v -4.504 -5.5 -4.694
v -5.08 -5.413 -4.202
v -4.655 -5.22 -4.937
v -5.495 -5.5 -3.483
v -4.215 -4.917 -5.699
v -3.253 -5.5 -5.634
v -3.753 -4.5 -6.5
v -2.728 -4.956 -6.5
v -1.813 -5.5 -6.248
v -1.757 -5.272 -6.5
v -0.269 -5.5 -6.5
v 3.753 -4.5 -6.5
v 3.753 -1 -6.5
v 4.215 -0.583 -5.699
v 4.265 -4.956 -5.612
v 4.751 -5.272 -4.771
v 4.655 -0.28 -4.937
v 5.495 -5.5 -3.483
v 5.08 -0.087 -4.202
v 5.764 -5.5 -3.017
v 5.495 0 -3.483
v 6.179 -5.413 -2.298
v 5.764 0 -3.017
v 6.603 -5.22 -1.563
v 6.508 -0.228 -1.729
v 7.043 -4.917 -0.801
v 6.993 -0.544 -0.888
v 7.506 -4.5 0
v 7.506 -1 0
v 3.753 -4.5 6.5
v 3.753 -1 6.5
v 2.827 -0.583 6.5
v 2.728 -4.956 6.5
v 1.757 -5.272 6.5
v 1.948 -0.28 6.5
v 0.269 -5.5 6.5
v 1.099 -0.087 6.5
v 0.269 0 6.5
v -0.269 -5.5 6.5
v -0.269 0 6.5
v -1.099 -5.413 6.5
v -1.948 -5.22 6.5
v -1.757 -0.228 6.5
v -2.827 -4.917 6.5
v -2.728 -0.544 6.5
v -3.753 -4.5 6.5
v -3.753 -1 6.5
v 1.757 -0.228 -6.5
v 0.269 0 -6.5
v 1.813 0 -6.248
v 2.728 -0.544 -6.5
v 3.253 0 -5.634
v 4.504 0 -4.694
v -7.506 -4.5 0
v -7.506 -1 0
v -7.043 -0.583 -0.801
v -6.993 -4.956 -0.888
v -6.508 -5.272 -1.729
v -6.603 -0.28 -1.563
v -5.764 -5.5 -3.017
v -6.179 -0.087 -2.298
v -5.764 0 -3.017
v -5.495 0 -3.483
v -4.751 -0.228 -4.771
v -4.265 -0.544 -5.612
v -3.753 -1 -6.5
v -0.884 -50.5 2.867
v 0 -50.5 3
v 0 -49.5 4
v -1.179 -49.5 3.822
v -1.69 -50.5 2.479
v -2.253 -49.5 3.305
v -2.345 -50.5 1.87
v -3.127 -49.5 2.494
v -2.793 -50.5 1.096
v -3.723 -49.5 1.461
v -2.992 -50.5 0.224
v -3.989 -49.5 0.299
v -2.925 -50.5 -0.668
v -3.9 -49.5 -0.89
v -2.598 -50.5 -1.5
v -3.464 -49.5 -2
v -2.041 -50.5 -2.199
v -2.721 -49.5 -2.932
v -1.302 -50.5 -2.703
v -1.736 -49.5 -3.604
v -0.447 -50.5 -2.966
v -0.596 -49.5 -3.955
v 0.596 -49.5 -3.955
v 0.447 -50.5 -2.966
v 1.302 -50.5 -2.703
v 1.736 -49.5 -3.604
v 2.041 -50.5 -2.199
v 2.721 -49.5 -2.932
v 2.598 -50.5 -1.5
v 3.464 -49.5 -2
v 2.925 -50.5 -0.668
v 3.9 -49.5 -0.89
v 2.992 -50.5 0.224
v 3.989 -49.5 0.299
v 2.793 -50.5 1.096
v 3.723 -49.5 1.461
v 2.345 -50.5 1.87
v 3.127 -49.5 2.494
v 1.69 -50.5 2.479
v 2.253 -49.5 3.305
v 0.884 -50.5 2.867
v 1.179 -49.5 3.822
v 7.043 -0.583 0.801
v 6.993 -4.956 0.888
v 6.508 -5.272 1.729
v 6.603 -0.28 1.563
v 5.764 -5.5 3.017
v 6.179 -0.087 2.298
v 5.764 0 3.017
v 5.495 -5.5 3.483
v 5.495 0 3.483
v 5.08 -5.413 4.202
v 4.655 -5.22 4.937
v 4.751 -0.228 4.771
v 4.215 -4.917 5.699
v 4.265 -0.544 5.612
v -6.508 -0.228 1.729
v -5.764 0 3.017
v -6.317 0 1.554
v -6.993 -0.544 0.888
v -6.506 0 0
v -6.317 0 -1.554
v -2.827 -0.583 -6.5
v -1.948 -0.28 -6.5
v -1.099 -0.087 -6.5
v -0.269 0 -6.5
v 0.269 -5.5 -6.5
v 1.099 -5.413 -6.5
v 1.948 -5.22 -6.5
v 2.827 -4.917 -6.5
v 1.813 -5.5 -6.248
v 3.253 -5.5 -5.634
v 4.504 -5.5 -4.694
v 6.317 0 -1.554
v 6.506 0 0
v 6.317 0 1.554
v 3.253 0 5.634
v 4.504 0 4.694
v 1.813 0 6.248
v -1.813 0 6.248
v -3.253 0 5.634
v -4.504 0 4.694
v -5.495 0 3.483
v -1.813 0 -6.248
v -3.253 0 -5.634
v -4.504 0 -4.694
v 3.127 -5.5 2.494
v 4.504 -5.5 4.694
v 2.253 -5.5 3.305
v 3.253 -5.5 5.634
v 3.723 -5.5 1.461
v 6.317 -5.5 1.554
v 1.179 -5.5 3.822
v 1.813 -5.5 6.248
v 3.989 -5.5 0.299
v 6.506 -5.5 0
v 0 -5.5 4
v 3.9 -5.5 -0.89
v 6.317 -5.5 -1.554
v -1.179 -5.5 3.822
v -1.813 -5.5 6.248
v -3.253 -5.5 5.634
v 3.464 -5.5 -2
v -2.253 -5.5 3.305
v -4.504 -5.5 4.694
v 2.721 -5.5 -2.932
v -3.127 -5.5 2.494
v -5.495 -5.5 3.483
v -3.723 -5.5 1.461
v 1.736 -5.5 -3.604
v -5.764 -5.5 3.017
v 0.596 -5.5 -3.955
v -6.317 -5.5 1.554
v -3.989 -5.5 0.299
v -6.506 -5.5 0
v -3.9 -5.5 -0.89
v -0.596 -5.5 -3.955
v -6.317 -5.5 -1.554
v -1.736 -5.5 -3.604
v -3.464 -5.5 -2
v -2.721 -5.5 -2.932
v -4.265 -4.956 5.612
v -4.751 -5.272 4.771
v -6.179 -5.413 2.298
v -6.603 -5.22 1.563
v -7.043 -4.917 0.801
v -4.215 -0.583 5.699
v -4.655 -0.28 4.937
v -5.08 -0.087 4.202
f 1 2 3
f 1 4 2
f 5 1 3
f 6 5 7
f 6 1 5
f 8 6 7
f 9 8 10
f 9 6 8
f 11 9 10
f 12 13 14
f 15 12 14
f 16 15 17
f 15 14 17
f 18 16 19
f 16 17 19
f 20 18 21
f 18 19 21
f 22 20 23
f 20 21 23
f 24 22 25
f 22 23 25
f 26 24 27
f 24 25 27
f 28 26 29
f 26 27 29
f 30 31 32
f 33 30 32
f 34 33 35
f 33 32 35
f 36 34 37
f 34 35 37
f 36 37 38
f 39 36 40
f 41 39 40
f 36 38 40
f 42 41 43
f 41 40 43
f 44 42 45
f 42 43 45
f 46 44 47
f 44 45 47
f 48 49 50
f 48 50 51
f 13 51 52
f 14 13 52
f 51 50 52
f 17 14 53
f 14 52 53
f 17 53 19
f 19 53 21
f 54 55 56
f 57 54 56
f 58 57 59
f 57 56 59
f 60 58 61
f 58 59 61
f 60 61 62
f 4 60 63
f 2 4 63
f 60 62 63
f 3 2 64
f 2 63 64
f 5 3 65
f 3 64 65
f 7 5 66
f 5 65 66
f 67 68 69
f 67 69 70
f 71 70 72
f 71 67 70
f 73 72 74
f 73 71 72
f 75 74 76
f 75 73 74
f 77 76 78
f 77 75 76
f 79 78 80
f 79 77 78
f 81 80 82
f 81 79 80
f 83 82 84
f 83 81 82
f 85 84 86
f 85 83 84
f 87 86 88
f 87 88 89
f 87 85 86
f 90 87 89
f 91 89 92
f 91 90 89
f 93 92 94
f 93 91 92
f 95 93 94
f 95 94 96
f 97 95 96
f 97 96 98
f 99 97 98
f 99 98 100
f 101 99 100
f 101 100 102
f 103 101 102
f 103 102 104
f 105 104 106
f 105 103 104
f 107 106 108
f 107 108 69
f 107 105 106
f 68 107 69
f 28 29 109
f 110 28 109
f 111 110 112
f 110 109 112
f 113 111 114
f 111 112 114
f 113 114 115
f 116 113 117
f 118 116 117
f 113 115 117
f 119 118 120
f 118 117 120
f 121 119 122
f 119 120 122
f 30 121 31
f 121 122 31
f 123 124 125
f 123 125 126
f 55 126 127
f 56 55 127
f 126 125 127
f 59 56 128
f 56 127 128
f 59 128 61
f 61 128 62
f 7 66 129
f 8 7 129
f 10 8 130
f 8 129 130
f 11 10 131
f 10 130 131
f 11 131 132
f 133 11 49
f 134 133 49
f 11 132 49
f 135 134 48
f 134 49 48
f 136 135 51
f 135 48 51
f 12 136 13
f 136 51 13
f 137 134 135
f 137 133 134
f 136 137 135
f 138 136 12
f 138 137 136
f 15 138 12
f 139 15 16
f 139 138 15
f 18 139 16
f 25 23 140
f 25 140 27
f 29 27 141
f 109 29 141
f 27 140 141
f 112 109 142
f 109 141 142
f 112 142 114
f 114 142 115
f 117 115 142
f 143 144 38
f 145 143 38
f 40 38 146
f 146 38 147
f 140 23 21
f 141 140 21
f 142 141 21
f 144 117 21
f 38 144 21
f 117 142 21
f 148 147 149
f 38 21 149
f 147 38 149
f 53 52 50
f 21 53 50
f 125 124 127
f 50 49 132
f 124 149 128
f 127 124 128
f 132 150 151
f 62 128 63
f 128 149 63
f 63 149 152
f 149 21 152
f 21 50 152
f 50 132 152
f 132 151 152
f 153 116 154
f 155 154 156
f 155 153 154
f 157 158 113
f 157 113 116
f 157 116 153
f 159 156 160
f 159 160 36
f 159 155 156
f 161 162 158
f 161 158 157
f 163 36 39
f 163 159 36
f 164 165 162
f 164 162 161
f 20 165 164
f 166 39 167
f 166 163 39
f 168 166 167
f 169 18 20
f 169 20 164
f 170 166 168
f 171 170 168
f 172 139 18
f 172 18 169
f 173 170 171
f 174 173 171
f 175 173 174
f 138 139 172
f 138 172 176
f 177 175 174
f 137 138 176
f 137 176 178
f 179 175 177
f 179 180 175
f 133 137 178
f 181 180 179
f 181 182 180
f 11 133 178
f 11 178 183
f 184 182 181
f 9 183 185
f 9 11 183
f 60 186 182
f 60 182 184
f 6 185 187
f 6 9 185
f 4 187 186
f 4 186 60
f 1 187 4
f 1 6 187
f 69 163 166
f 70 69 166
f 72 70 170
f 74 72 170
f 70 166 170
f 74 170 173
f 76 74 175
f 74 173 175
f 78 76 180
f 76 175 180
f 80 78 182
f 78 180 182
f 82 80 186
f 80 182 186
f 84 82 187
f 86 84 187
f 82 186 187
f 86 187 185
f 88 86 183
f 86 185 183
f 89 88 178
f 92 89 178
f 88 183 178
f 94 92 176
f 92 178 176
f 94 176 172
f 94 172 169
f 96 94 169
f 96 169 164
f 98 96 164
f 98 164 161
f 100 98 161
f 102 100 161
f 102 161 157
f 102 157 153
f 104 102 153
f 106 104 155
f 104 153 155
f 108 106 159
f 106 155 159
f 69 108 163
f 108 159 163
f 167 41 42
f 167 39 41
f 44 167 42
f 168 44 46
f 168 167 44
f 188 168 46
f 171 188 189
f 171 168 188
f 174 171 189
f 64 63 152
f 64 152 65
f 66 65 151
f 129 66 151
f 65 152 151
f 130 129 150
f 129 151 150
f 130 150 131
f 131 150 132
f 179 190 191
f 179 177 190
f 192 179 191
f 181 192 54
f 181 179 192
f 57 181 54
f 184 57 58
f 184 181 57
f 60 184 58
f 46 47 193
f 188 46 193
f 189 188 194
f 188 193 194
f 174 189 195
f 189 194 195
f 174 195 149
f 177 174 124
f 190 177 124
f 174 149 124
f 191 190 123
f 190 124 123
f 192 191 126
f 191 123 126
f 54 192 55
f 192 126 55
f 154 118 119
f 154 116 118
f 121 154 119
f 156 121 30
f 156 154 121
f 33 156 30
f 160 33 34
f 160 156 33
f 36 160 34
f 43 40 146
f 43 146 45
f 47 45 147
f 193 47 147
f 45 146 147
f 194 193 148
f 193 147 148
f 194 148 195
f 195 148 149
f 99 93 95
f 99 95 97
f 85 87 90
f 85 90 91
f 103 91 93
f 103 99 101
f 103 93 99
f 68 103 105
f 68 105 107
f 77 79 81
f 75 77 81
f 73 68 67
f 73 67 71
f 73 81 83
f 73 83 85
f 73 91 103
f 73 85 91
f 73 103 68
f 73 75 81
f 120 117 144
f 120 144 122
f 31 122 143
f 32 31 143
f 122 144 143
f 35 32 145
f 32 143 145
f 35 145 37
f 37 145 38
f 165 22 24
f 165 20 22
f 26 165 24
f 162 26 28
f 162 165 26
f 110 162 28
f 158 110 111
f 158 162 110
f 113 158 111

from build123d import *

# Parameters (mm, degrees)
EXTRUDE_1_DEPTH = 5.5
SKETCH_5_R      = 4
EXTRUDE_2_DEPTH = 45
CHAMFER_1_SIZE  = 1


with BuildPart() as part:
    # Эскиз1 → Вытянуть1 (new body)
    with BuildSketch(Plane(origin=(0, 0, 0), x_dir=(1, 0, 0), z_dir=(0, 1, 0))):
        Polygon((-3.75277675, 6.5), (3.75277675, 6.5), (7.505553499, 0), (3.75277675, -6.5), (-3.75277675, -6.5), (-7.505553499, 0), align=None)
    extrude(amount=-EXTRUDE_1_DEPTH)

    # Эскиз5 → Вытянуть2 (add)
    with BuildSketch(Plane.XZ.offset(5.5)):
        with Locations(Location((0, 0, 0), (0, 0, 90))):
            Circle(SKETCH_5_R)
    extrude(amount=EXTRUDE_2_DEPTH)

    # Фаска1
    chamfer_1_edges = [part.edges().sort_by_distance(p)[0] for p in [
        (0, -50.5, -4),
    ]]
    chamfer(chamfer_1_edges, length=CHAMFER_1_SIZE)

    # Эскиз4 → Вырез-Повернуть1 (revolve, cut)
    with BuildSketch(Plane.XY):
        Polygon((-7.505553499, -1), (-6.505553499, 0), (-7.505553499, 0), align=None)
        Polygon((-7.505553499, -4.5), (-6.505553499, -5.5), (-7.505553499, -5.5), align=None)
    revolve(axis=Axis((0, -5.5, 0), (0, -1, 0)), mode=Mode.SUBTRACT)


solid = part.part
